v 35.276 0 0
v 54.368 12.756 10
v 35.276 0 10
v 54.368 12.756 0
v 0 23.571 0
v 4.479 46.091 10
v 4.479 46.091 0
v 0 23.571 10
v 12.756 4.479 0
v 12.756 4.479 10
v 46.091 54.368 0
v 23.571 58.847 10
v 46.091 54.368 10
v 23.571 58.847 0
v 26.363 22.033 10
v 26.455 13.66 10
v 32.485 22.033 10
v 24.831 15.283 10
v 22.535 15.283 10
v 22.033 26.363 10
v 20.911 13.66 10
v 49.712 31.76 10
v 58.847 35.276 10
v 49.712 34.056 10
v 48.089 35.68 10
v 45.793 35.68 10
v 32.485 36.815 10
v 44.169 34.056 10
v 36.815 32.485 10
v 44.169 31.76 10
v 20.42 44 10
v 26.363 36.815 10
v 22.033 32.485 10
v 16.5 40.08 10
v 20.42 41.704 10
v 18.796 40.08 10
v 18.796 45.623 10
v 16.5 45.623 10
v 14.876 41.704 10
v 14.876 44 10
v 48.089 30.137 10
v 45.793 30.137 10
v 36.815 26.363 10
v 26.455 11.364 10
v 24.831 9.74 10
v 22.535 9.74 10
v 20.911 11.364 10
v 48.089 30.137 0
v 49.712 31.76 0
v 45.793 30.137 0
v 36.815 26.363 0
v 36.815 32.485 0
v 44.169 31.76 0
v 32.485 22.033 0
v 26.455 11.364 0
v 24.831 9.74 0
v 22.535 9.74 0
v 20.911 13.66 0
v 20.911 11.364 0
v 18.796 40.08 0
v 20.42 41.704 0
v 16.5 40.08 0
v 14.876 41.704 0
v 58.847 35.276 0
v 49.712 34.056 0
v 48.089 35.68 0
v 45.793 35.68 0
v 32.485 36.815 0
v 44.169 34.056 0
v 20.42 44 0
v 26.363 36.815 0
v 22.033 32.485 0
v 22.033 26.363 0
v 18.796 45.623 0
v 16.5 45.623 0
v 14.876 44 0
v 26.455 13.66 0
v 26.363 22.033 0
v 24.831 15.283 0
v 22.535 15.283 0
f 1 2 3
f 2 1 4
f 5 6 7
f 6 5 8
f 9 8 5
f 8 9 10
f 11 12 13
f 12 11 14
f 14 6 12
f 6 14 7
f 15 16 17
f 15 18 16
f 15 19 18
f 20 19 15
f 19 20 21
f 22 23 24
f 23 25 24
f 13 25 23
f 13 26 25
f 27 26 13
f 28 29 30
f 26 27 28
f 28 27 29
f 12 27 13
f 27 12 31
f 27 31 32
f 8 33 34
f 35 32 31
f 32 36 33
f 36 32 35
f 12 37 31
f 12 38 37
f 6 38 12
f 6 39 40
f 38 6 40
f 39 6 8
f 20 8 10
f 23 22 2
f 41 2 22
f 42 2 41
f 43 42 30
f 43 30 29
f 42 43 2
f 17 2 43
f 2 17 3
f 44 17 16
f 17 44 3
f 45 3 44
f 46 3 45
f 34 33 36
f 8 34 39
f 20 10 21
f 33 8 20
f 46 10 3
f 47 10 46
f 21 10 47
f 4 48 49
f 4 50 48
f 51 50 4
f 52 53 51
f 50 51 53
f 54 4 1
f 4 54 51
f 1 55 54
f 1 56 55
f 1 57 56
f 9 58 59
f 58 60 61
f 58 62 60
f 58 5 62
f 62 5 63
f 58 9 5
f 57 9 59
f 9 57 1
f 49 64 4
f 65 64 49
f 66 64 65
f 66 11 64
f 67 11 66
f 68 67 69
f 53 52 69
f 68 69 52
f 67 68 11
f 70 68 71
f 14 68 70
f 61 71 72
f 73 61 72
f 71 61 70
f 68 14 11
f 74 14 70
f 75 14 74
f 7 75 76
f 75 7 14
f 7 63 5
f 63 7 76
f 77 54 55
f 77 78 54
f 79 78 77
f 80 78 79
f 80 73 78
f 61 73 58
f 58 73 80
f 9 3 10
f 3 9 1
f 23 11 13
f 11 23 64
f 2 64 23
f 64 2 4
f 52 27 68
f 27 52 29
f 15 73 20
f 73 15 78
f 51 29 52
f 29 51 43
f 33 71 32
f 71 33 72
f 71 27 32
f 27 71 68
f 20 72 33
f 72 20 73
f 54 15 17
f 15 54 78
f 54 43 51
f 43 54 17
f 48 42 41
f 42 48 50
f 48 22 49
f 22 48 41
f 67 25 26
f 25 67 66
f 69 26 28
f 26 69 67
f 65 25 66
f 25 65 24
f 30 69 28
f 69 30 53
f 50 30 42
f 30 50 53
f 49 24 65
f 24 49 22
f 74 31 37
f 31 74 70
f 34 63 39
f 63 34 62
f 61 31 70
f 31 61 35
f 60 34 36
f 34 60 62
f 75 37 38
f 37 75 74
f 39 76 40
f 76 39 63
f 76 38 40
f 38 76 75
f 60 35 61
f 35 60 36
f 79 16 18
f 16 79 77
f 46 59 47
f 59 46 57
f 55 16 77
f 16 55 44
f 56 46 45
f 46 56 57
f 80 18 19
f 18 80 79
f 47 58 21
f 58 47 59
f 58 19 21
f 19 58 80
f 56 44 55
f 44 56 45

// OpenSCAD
$fn = 32;

// ----------------------------------------------------------------------
// Polygon plate: 8-gon R30, 3 bolt windows
// ----------------------------------------------------------------------

// --- parameters (mm) ---
sides = 8;                // number of polygon sides
plate_r = 30;             // circumscribed radius of the polygon
bore_r = 8;               // centre bore radius
bolts = 3;                // number of bolt windows
ring_r = 17.86;           // bolt-circle radius
bolt_r = 3;               // bolt window radius
plate_t = 10;             // plate thickness, Z (extrusion height)

plate_d = 2 * plate_r;  // circumscribed diameter
bore_d = 2 * bore_r;  // centre bore diameter
bolt_d = 2 * bolt_r;  // bolt window diameter
ring_d = 2 * ring_r;  // bolt-circle diameter

profile = [[58.847, 35.276], [46.091, 54.368], [23.571, 58.847], [4.479, 46.091], [0, 23.571], [12.756, 4.479], [35.276, 0], [54.368, 12.756]];  // primary outline, 8 points, counter clockwise
void_1 = [[36.815, 32.485], [32.485, 36.815], [26.363, 36.815], [22.033, 32.485], [22.033, 26.363], [26.363, 22.033], [32.485, 22.033], [36.815, 26.363]];  // centre bore, 8 points
void_2 = [[49.712, 34.056], [48.089, 35.68], [45.793, 35.68], [44.169, 34.056], [44.169, 31.76], [45.793, 30.137], [48.089, 30.137], [49.712, 31.76]];  // bolt window 1, 8 points
void_3 = [[20.42, 44], [18.796, 45.623], [16.5, 45.623], [14.876, 44], [14.876, 41.704], [16.5, 40.08], [18.796, 40.08], [20.42, 41.704]];  // bolt window 2, 8 points
void_4 = [[26.455, 13.66], [24.831, 15.283], [22.535, 15.283], [20.911, 13.66], [20.911, 11.364], [22.535, 9.74], [24.831, 9.74], [26.455, 11.364]];  // bolt window 3, 8 points

// --- the one profile operation ---
difference() {
  linear_extrude(height = plate_t) polygon(points = profile);
  translate([0, 0, -1])
    linear_extrude(height = plate_t + 2) polygon(points = void_1);
  translate([0, 0, -1])
    linear_extrude(height = plate_t + 2) polygon(points = void_2);
  translate([0, 0, -1])
    linear_extrude(height = plate_t + 2) polygon(points = void_3);
  translate([0, 0, -1])
    linear_extrude(height = plate_t + 2) polygon(points = void_4);
}
